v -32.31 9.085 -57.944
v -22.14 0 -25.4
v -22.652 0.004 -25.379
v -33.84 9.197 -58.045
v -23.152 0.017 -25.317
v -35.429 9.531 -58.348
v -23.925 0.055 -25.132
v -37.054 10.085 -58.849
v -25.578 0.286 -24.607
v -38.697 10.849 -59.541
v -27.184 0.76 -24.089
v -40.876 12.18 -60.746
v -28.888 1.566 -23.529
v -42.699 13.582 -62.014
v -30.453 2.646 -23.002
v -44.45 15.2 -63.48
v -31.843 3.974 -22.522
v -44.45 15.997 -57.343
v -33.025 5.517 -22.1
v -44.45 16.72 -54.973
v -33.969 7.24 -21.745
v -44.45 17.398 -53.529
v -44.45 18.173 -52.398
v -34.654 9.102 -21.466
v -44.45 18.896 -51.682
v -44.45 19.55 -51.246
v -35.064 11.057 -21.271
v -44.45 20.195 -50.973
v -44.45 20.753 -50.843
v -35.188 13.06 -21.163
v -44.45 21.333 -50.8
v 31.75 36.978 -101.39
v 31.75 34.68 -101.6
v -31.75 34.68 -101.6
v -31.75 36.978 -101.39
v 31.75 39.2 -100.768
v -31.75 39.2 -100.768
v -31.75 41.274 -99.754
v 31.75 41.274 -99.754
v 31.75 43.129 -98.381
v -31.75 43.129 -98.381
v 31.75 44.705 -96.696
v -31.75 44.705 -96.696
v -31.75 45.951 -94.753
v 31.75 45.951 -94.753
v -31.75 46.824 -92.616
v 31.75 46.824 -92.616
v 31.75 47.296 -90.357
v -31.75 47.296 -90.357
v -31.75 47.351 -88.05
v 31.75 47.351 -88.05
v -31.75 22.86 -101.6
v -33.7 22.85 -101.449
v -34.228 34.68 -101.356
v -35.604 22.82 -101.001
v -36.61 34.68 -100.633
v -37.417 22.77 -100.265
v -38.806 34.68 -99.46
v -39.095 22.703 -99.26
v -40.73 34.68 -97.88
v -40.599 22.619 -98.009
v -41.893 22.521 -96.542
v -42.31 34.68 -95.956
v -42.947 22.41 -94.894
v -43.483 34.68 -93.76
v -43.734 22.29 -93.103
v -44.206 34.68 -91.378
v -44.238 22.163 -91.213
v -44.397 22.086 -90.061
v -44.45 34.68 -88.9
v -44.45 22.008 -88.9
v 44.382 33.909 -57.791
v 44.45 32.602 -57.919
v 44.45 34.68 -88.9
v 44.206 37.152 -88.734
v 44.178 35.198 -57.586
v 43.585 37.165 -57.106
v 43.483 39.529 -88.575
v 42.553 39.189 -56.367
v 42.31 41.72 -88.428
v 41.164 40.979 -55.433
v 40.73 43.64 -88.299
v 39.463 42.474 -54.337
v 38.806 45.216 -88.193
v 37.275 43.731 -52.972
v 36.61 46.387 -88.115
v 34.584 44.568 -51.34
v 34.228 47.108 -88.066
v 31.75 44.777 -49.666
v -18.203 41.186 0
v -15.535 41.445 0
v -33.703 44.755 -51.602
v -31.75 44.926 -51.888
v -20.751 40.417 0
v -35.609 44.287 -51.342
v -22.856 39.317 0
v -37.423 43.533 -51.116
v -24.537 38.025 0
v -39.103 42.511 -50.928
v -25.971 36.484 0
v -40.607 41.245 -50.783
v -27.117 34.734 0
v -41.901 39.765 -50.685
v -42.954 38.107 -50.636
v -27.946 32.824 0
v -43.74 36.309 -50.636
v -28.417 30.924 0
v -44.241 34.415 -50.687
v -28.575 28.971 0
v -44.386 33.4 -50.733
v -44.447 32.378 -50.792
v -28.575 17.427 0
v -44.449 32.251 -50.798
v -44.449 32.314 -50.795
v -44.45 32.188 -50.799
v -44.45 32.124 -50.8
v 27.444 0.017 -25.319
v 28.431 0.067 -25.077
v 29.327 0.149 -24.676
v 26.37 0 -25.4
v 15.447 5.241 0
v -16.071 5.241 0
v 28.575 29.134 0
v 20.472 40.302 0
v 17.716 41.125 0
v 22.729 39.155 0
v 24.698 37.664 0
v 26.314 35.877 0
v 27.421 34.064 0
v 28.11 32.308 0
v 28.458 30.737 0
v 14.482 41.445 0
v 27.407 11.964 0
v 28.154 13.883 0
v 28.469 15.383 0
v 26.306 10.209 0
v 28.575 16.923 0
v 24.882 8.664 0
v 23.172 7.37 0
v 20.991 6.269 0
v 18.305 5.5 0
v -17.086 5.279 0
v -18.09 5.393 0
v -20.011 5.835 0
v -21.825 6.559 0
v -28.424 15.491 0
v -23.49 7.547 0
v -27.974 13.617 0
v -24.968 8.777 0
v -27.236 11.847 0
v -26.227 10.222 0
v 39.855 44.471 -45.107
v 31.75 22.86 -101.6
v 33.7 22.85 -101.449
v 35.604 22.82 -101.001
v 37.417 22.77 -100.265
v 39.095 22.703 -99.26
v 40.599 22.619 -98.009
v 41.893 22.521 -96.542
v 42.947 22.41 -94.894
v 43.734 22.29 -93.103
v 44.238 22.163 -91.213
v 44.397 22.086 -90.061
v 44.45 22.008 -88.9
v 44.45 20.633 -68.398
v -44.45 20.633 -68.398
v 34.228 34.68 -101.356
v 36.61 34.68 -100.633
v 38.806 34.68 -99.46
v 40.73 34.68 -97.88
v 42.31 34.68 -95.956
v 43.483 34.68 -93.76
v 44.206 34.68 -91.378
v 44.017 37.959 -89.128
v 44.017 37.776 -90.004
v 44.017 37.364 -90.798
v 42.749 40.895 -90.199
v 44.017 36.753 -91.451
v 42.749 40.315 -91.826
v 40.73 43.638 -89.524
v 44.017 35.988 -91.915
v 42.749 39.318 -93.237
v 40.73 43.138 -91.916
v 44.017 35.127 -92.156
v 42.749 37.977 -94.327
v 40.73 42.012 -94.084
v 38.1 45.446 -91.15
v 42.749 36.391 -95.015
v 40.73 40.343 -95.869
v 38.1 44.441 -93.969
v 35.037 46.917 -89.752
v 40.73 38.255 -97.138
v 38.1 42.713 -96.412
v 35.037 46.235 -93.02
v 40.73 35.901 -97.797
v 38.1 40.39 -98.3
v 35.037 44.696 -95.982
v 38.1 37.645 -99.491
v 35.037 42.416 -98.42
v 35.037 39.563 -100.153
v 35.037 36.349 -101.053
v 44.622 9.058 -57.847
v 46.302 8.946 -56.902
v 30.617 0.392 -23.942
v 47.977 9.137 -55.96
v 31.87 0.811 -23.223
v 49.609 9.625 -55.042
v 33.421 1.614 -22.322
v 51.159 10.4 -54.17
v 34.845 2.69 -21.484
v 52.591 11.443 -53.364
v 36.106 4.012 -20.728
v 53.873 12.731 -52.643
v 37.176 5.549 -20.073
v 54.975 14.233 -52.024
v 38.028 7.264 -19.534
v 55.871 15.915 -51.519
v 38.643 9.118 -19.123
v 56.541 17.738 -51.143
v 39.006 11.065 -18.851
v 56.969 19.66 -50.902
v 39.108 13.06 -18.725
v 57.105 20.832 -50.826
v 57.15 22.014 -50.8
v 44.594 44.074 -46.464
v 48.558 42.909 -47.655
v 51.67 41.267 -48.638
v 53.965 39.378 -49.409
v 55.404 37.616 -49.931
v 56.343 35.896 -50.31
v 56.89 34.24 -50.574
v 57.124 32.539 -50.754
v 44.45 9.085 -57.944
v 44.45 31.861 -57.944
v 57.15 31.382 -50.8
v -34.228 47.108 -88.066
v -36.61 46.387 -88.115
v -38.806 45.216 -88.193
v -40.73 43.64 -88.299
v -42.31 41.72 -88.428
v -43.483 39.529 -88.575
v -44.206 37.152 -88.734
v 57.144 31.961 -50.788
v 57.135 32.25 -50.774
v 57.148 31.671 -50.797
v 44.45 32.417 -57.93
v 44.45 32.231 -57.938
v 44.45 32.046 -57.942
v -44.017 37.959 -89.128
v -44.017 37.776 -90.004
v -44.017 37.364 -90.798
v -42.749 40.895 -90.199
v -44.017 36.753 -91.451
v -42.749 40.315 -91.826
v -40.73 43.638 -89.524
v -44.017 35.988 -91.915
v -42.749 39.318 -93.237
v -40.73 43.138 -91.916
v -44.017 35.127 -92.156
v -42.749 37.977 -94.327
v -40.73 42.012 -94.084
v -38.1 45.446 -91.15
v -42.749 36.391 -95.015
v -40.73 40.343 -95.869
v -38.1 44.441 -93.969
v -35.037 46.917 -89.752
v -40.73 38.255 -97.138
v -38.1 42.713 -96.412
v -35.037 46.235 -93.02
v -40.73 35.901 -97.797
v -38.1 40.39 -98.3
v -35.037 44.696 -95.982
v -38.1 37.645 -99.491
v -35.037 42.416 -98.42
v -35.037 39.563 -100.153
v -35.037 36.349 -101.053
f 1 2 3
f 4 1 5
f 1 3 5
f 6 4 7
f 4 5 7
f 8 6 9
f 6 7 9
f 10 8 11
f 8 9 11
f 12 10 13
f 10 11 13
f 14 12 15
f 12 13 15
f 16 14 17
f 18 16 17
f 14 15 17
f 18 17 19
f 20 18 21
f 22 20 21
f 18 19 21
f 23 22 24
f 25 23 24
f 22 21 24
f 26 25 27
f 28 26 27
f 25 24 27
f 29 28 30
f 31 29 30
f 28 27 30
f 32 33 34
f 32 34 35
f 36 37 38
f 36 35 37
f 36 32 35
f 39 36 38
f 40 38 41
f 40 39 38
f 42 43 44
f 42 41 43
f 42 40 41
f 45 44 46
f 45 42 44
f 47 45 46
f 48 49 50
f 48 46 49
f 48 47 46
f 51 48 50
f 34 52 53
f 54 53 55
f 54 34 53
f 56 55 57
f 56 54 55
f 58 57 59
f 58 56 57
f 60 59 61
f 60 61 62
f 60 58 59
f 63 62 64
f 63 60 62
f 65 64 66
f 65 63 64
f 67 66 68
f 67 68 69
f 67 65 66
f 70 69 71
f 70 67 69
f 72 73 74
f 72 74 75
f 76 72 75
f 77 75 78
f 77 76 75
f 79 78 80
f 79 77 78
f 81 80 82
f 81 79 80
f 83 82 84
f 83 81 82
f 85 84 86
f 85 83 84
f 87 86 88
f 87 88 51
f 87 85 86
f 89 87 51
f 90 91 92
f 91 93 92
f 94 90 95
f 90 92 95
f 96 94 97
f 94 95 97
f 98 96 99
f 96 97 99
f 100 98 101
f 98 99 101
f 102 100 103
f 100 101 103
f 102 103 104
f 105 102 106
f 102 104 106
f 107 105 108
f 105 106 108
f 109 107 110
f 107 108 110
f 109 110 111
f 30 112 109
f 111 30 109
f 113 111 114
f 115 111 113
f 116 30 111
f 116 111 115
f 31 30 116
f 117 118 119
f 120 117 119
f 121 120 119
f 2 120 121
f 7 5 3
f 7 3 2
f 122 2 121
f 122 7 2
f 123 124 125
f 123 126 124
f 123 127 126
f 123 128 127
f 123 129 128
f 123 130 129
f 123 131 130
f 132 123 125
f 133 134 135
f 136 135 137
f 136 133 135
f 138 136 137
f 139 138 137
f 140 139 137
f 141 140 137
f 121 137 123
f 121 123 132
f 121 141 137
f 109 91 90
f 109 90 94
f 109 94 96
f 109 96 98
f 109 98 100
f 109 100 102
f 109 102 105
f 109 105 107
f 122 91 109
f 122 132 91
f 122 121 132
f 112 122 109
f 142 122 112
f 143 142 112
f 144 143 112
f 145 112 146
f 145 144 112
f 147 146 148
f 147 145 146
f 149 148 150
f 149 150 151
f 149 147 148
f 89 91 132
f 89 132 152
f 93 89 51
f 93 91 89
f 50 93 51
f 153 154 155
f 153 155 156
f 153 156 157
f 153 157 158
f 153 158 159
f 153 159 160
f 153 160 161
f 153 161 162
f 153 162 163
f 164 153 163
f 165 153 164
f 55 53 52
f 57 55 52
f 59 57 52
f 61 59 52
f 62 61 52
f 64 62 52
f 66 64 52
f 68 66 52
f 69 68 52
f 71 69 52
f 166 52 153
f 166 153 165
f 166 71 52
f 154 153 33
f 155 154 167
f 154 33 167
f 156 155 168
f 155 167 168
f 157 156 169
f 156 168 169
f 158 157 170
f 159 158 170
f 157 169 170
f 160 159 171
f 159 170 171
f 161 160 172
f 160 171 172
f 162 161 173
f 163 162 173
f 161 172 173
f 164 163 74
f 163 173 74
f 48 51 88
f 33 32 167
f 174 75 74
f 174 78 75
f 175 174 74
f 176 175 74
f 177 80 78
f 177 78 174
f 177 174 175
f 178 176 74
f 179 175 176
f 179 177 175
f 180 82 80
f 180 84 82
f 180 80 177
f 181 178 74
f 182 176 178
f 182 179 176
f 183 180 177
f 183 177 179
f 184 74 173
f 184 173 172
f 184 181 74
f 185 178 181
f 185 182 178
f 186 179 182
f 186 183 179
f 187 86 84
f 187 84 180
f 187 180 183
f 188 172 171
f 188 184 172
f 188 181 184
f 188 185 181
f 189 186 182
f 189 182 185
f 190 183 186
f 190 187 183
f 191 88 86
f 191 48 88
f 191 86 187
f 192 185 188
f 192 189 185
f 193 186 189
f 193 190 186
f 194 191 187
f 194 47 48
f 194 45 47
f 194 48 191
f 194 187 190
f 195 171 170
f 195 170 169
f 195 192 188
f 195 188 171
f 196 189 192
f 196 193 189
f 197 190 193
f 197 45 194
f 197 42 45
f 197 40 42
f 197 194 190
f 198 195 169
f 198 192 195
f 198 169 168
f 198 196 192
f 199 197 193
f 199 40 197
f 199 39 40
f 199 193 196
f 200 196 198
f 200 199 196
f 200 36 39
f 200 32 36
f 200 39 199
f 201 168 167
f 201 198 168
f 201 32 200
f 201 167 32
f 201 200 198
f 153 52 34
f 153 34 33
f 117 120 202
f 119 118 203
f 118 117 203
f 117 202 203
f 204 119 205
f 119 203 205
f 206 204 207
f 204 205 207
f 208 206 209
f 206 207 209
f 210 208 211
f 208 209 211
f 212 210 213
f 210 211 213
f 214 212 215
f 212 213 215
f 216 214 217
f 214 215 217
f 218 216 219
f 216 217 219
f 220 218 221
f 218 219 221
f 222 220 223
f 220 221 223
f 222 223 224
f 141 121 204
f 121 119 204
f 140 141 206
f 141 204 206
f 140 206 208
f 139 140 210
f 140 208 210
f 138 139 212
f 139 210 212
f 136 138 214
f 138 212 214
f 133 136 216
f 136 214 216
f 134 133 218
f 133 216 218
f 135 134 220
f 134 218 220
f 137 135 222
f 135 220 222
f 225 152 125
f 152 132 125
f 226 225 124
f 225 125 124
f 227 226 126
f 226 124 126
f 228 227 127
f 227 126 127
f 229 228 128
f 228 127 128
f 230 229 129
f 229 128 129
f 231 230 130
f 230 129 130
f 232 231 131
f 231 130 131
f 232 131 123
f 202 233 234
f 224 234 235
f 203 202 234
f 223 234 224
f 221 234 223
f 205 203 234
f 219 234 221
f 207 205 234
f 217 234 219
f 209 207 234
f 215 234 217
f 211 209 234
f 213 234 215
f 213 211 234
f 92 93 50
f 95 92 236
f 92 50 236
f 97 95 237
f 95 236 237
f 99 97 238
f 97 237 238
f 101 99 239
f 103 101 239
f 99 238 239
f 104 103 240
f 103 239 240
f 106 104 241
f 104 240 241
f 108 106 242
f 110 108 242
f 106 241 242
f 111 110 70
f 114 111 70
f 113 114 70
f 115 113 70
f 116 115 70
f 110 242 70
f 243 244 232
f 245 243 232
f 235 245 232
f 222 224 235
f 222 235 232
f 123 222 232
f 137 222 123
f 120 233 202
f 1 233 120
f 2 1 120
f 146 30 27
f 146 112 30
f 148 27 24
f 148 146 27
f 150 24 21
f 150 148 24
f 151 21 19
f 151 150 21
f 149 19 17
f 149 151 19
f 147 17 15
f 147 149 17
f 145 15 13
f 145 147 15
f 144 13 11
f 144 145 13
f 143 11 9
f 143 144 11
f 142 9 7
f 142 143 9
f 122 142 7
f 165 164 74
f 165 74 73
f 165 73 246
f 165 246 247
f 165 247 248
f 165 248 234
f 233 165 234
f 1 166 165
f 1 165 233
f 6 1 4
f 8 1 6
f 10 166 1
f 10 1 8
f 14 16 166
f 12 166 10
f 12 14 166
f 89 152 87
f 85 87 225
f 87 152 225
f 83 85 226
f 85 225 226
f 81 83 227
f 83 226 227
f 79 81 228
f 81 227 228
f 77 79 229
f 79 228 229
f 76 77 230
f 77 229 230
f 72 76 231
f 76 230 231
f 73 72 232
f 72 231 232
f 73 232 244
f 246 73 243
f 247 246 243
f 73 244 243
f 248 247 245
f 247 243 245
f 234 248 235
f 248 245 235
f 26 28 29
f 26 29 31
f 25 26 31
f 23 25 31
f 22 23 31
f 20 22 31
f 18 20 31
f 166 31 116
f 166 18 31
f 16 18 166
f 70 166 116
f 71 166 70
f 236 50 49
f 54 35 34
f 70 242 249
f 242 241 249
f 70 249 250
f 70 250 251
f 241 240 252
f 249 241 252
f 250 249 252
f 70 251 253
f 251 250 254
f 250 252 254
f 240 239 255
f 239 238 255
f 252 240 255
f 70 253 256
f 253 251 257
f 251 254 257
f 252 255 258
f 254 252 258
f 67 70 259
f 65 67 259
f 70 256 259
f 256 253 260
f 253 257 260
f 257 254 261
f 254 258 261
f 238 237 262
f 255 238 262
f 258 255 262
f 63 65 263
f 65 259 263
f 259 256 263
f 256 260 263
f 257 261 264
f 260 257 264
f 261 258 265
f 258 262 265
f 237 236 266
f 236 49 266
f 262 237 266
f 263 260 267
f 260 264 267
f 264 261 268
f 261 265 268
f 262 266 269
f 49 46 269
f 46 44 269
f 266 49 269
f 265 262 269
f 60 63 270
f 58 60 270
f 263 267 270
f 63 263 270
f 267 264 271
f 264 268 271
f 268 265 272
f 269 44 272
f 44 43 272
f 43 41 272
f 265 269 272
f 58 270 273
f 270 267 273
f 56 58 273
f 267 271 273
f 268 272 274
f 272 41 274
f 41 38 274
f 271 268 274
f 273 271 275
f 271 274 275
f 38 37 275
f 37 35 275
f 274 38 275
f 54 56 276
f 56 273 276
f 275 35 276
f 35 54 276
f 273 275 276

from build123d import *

# Parameters (mm, degrees)
EXTRUDE1_DEPTH     = 48.26
SKETCH3_OUTSIDE_W  = 133.914
SKETCH3_OUTSIDE_H  = 80.574
CUT_EXTRUDE1_DEPTH = 127
FILLET1_R          = 12.7
FILLET2_R          = 12.7


with BuildPart() as part:
    # Sketch1 → Extrude1 (new body)
    with BuildSketch(Plane(origin=(0, 0, 0), x_dir=(1, 0, 0), z_dir=(0, 1, 0))):
        Polygon((-44.45, 101.6), (44.45, 101.6), (44.45, 57.94375), (57.15, 50.8), (28.575, 0), (-28.575, 0), (-44.45, 50.8), align=None)
    extrude(amount=EXTRUDE1_DEPTH)

    # Sketch3 outside → Cut-Extrude1 (cut, symmetric)
    with BuildSketch(Plane.ZY.offset(44.45)):
        with Locations((-50.8, 24.13)):
            Rectangle(SKETCH3_OUTSIDE_W, SKETCH3_OUTSIDE_H)
        Polygon((0, 41.445288221), (-101.6, 48.26), (-101.6, 22.86), (-68.397585835, 20.632983436), (-57.94375, 9.084619968), (-25.4, 0), (0, 5.240594668), align=None, mode=Mode.SUBTRACT)
    extrude(amount=CUT_EXTRUDE1_DEPTH, both=True, mode=Mode.SUBTRACT)

    # Fillet1
    fillet1_edges = [part.edges().sort_by_distance(p)[0] for p in [
        (-44.45, 35.56, -101.6),
        (44.45, 35.56, -101.6),
        (0, 48.26, -101.6),
        (-44.45, 46.556322055, -76.2),
        (-36.5125, 43.148966165, -25.4),
        (42.8625, 43.148966165, -25.4),
        (50.8, 45.092223821, -54.371875),
        (44.45, 46.795901766, -79.771875),
    ]]
    fillet(fillet1_edges, radius=FILLET1_R)

    # Fillet2
    fillet2_edges = [part.edges().sort_by_distance(p)[0] for p in [
        (-40.48125, 3.545217548, -38.1),
        (-32.54375, 2.620297334, -12.7),
        (50.00625, 3.545217548, -38.1),
        (35.71875, 2.620297334, -12.7),
    ]]
    fillet(fillet2_edges, radius=FILLET2_R)


solid = part.part
